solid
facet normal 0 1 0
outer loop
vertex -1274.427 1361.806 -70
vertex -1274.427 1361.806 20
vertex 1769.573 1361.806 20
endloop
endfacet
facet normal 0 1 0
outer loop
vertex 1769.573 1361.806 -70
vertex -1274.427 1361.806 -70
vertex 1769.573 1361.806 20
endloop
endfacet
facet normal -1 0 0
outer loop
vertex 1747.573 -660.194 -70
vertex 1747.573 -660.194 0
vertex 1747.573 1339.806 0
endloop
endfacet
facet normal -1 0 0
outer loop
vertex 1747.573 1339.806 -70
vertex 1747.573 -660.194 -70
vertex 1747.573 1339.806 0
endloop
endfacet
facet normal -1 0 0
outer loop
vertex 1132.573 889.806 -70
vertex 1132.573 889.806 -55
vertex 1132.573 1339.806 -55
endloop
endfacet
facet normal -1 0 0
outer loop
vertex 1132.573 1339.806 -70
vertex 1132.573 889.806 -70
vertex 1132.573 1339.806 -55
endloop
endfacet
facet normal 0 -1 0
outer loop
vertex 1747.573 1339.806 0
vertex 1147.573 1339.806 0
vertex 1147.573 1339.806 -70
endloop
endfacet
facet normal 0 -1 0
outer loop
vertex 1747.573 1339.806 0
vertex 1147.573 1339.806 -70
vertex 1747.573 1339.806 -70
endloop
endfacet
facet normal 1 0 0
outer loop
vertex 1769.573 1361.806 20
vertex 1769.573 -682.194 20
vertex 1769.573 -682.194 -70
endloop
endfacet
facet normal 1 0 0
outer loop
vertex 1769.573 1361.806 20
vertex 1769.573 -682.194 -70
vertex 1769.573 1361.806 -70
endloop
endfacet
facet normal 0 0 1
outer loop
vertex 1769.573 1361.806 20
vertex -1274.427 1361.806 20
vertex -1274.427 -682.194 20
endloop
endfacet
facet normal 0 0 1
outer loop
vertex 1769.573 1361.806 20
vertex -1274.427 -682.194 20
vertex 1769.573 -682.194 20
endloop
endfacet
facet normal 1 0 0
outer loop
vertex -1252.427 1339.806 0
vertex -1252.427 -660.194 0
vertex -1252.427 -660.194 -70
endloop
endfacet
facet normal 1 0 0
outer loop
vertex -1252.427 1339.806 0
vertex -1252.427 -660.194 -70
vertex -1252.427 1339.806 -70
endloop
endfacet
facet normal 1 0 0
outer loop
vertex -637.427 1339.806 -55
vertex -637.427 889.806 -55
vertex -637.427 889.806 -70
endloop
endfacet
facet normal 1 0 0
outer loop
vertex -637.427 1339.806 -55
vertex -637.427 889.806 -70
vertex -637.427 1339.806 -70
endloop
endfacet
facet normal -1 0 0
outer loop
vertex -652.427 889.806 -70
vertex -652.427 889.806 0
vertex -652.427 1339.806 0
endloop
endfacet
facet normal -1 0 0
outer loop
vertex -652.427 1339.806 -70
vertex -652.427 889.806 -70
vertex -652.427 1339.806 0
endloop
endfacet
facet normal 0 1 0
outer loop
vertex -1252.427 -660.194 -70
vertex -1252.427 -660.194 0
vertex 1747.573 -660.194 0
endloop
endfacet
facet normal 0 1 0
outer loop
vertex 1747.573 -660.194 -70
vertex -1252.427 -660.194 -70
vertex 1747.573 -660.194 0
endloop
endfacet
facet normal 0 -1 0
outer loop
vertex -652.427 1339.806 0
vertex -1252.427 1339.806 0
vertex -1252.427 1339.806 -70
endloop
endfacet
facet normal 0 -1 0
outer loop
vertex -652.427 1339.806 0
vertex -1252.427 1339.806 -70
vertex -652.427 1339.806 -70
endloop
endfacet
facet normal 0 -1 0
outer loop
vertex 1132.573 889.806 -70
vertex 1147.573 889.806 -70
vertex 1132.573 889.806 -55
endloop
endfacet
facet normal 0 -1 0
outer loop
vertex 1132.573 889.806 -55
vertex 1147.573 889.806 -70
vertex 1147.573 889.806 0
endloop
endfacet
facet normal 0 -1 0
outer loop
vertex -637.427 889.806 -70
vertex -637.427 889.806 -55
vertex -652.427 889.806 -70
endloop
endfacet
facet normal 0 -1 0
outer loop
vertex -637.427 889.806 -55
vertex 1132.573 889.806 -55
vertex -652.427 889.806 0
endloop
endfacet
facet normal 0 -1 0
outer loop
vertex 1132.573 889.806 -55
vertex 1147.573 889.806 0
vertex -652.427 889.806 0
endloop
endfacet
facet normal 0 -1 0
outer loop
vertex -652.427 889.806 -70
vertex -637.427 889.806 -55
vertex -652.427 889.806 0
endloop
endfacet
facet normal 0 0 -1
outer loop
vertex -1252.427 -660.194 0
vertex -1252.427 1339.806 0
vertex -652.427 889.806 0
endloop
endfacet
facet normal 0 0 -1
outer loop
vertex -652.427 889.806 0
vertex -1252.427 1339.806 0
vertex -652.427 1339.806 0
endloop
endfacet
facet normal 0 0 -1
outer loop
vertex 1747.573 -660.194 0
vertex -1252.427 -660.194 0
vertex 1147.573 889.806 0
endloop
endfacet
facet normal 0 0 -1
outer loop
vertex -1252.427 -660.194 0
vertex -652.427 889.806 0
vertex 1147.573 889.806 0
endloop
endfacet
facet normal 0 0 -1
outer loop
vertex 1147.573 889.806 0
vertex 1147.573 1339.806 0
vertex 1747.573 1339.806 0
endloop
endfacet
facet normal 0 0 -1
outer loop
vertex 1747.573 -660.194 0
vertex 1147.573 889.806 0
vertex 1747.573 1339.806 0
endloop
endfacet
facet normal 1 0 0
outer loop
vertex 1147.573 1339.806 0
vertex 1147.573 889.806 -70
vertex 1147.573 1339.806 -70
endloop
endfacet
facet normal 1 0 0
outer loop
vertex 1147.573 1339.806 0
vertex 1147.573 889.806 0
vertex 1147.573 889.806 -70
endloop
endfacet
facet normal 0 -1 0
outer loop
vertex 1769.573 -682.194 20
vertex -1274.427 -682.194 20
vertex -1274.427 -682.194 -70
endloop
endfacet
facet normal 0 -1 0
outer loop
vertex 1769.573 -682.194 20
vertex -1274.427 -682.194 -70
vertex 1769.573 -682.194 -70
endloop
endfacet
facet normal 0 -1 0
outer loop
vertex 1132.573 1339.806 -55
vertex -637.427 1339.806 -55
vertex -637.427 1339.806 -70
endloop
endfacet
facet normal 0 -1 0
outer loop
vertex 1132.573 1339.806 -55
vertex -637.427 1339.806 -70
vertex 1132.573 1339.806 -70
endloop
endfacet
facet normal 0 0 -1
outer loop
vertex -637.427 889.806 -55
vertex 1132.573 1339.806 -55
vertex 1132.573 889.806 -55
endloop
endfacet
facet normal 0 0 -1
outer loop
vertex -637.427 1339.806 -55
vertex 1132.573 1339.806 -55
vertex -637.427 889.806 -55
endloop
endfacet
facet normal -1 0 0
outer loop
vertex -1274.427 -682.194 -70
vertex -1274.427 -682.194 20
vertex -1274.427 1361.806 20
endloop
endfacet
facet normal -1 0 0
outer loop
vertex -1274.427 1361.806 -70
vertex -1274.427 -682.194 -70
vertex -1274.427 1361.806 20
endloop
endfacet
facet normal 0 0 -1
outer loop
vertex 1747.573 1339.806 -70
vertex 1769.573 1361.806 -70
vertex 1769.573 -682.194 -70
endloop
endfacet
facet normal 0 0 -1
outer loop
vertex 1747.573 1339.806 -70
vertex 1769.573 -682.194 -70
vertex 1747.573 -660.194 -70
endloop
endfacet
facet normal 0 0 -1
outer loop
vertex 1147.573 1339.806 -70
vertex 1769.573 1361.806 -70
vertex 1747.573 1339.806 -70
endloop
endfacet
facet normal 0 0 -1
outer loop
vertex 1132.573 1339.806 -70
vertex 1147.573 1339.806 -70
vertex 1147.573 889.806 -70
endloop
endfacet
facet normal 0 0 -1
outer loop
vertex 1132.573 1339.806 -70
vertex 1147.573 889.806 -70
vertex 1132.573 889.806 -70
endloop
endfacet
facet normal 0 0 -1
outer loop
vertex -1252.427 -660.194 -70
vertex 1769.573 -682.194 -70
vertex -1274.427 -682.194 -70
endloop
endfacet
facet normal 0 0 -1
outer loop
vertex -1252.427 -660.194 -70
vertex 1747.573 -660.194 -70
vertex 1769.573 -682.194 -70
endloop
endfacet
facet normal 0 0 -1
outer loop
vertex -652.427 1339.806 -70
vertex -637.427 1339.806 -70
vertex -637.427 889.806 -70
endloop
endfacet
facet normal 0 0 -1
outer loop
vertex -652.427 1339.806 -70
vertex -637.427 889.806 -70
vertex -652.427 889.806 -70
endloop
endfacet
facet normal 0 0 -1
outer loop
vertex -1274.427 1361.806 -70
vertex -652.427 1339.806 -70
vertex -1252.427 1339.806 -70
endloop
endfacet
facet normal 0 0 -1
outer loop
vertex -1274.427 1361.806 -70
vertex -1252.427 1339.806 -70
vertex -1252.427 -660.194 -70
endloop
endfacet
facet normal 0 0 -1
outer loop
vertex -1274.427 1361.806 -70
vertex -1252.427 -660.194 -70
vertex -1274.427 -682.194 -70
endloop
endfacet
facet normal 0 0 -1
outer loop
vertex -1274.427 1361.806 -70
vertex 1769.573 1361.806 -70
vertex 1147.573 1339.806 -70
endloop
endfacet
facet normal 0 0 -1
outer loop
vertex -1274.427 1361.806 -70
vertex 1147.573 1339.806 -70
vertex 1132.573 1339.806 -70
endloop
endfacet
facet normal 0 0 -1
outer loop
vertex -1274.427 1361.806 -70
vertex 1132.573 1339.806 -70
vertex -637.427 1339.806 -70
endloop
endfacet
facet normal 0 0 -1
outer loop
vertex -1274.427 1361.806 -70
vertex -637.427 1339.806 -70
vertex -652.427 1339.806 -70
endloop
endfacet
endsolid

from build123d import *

# Parameters (mm, degrees)
ESQUISSE1_W        = 3000
ESQUISSE1_H        = 2000
BOSS_EXTRU_1_DEPTH = 20
ESQUISSE2_W        = 3044
ESQUISSE2_H        = 2044
ESQUISSE2_W_2      = 3000
ESQUISSE2_H_2      = 2000
BOSS_EXTRU_2_DEPTH = 90
ESQUISSE3_W        = 1800
ESQUISSE3_H        = 450
BOSS_EXTRU_3_DEPTH = 55
ESQUISSE4_W        = 15
ESQUISSE4_H        = 450
BOSS_EXTRU_4_DEPTH = 15


with BuildPart() as part:
    # Esquisse1 → Boss.-Extru.1 (new body)
    with BuildSketch(Plane.XY):
        with Locations((247.572815534, 339.805825243)):
            Rectangle(ESQUISSE1_W, ESQUISSE1_H)
    extrude(amount=BOSS_EXTRU_1_DEPTH)

    # Esquisse2 → Boss.-Extru.2 (add)
    with BuildSketch(Plane.XY.offset(20)):
        with Locations((247.572815534, 339.805825243)):
            Rectangle(ESQUISSE2_W, ESQUISSE2_H)
        with Locations((247.572815534, 339.805825243)):
            Rectangle(ESQUISSE2_W_2, ESQUISSE2_H_2, mode=Mode.SUBTRACT)
    extrude(amount=-BOSS_EXTRU_2_DEPTH)

    # Esquisse3 → Boss.-Extru.3 (add)
    with BuildSketch(Plane(origin=(0, 0, 0), x_dir=(-1, 0, 0), z_dir=(0, 0, -1))):
        with Locations((-247.572815534, 1114.805825243)):
            Rectangle(ESQUISSE3_W, ESQUISSE3_H)
    extrude(amount=BOSS_EXTRU_3_DEPTH)

    # Esquisse4 → Boss.-Extru.4 (add)
    with BuildSketch(Plane(origin=(0, 0, -55), x_dir=(-1, 0, 0), z_dir=(0, 0, -1))):
        with Locations((-1140.072815534, 1114.805825243)):
            Rectangle(ESQUISSE4_W, ESQUISSE4_H)
        with Locations((644.927184466, 1114.805825243)):
            Rectangle(ESQUISSE4_W, ESQUISSE4_H)
    extrude(amount=BOSS_EXTRU_4_DEPTH)


solid = part.part
